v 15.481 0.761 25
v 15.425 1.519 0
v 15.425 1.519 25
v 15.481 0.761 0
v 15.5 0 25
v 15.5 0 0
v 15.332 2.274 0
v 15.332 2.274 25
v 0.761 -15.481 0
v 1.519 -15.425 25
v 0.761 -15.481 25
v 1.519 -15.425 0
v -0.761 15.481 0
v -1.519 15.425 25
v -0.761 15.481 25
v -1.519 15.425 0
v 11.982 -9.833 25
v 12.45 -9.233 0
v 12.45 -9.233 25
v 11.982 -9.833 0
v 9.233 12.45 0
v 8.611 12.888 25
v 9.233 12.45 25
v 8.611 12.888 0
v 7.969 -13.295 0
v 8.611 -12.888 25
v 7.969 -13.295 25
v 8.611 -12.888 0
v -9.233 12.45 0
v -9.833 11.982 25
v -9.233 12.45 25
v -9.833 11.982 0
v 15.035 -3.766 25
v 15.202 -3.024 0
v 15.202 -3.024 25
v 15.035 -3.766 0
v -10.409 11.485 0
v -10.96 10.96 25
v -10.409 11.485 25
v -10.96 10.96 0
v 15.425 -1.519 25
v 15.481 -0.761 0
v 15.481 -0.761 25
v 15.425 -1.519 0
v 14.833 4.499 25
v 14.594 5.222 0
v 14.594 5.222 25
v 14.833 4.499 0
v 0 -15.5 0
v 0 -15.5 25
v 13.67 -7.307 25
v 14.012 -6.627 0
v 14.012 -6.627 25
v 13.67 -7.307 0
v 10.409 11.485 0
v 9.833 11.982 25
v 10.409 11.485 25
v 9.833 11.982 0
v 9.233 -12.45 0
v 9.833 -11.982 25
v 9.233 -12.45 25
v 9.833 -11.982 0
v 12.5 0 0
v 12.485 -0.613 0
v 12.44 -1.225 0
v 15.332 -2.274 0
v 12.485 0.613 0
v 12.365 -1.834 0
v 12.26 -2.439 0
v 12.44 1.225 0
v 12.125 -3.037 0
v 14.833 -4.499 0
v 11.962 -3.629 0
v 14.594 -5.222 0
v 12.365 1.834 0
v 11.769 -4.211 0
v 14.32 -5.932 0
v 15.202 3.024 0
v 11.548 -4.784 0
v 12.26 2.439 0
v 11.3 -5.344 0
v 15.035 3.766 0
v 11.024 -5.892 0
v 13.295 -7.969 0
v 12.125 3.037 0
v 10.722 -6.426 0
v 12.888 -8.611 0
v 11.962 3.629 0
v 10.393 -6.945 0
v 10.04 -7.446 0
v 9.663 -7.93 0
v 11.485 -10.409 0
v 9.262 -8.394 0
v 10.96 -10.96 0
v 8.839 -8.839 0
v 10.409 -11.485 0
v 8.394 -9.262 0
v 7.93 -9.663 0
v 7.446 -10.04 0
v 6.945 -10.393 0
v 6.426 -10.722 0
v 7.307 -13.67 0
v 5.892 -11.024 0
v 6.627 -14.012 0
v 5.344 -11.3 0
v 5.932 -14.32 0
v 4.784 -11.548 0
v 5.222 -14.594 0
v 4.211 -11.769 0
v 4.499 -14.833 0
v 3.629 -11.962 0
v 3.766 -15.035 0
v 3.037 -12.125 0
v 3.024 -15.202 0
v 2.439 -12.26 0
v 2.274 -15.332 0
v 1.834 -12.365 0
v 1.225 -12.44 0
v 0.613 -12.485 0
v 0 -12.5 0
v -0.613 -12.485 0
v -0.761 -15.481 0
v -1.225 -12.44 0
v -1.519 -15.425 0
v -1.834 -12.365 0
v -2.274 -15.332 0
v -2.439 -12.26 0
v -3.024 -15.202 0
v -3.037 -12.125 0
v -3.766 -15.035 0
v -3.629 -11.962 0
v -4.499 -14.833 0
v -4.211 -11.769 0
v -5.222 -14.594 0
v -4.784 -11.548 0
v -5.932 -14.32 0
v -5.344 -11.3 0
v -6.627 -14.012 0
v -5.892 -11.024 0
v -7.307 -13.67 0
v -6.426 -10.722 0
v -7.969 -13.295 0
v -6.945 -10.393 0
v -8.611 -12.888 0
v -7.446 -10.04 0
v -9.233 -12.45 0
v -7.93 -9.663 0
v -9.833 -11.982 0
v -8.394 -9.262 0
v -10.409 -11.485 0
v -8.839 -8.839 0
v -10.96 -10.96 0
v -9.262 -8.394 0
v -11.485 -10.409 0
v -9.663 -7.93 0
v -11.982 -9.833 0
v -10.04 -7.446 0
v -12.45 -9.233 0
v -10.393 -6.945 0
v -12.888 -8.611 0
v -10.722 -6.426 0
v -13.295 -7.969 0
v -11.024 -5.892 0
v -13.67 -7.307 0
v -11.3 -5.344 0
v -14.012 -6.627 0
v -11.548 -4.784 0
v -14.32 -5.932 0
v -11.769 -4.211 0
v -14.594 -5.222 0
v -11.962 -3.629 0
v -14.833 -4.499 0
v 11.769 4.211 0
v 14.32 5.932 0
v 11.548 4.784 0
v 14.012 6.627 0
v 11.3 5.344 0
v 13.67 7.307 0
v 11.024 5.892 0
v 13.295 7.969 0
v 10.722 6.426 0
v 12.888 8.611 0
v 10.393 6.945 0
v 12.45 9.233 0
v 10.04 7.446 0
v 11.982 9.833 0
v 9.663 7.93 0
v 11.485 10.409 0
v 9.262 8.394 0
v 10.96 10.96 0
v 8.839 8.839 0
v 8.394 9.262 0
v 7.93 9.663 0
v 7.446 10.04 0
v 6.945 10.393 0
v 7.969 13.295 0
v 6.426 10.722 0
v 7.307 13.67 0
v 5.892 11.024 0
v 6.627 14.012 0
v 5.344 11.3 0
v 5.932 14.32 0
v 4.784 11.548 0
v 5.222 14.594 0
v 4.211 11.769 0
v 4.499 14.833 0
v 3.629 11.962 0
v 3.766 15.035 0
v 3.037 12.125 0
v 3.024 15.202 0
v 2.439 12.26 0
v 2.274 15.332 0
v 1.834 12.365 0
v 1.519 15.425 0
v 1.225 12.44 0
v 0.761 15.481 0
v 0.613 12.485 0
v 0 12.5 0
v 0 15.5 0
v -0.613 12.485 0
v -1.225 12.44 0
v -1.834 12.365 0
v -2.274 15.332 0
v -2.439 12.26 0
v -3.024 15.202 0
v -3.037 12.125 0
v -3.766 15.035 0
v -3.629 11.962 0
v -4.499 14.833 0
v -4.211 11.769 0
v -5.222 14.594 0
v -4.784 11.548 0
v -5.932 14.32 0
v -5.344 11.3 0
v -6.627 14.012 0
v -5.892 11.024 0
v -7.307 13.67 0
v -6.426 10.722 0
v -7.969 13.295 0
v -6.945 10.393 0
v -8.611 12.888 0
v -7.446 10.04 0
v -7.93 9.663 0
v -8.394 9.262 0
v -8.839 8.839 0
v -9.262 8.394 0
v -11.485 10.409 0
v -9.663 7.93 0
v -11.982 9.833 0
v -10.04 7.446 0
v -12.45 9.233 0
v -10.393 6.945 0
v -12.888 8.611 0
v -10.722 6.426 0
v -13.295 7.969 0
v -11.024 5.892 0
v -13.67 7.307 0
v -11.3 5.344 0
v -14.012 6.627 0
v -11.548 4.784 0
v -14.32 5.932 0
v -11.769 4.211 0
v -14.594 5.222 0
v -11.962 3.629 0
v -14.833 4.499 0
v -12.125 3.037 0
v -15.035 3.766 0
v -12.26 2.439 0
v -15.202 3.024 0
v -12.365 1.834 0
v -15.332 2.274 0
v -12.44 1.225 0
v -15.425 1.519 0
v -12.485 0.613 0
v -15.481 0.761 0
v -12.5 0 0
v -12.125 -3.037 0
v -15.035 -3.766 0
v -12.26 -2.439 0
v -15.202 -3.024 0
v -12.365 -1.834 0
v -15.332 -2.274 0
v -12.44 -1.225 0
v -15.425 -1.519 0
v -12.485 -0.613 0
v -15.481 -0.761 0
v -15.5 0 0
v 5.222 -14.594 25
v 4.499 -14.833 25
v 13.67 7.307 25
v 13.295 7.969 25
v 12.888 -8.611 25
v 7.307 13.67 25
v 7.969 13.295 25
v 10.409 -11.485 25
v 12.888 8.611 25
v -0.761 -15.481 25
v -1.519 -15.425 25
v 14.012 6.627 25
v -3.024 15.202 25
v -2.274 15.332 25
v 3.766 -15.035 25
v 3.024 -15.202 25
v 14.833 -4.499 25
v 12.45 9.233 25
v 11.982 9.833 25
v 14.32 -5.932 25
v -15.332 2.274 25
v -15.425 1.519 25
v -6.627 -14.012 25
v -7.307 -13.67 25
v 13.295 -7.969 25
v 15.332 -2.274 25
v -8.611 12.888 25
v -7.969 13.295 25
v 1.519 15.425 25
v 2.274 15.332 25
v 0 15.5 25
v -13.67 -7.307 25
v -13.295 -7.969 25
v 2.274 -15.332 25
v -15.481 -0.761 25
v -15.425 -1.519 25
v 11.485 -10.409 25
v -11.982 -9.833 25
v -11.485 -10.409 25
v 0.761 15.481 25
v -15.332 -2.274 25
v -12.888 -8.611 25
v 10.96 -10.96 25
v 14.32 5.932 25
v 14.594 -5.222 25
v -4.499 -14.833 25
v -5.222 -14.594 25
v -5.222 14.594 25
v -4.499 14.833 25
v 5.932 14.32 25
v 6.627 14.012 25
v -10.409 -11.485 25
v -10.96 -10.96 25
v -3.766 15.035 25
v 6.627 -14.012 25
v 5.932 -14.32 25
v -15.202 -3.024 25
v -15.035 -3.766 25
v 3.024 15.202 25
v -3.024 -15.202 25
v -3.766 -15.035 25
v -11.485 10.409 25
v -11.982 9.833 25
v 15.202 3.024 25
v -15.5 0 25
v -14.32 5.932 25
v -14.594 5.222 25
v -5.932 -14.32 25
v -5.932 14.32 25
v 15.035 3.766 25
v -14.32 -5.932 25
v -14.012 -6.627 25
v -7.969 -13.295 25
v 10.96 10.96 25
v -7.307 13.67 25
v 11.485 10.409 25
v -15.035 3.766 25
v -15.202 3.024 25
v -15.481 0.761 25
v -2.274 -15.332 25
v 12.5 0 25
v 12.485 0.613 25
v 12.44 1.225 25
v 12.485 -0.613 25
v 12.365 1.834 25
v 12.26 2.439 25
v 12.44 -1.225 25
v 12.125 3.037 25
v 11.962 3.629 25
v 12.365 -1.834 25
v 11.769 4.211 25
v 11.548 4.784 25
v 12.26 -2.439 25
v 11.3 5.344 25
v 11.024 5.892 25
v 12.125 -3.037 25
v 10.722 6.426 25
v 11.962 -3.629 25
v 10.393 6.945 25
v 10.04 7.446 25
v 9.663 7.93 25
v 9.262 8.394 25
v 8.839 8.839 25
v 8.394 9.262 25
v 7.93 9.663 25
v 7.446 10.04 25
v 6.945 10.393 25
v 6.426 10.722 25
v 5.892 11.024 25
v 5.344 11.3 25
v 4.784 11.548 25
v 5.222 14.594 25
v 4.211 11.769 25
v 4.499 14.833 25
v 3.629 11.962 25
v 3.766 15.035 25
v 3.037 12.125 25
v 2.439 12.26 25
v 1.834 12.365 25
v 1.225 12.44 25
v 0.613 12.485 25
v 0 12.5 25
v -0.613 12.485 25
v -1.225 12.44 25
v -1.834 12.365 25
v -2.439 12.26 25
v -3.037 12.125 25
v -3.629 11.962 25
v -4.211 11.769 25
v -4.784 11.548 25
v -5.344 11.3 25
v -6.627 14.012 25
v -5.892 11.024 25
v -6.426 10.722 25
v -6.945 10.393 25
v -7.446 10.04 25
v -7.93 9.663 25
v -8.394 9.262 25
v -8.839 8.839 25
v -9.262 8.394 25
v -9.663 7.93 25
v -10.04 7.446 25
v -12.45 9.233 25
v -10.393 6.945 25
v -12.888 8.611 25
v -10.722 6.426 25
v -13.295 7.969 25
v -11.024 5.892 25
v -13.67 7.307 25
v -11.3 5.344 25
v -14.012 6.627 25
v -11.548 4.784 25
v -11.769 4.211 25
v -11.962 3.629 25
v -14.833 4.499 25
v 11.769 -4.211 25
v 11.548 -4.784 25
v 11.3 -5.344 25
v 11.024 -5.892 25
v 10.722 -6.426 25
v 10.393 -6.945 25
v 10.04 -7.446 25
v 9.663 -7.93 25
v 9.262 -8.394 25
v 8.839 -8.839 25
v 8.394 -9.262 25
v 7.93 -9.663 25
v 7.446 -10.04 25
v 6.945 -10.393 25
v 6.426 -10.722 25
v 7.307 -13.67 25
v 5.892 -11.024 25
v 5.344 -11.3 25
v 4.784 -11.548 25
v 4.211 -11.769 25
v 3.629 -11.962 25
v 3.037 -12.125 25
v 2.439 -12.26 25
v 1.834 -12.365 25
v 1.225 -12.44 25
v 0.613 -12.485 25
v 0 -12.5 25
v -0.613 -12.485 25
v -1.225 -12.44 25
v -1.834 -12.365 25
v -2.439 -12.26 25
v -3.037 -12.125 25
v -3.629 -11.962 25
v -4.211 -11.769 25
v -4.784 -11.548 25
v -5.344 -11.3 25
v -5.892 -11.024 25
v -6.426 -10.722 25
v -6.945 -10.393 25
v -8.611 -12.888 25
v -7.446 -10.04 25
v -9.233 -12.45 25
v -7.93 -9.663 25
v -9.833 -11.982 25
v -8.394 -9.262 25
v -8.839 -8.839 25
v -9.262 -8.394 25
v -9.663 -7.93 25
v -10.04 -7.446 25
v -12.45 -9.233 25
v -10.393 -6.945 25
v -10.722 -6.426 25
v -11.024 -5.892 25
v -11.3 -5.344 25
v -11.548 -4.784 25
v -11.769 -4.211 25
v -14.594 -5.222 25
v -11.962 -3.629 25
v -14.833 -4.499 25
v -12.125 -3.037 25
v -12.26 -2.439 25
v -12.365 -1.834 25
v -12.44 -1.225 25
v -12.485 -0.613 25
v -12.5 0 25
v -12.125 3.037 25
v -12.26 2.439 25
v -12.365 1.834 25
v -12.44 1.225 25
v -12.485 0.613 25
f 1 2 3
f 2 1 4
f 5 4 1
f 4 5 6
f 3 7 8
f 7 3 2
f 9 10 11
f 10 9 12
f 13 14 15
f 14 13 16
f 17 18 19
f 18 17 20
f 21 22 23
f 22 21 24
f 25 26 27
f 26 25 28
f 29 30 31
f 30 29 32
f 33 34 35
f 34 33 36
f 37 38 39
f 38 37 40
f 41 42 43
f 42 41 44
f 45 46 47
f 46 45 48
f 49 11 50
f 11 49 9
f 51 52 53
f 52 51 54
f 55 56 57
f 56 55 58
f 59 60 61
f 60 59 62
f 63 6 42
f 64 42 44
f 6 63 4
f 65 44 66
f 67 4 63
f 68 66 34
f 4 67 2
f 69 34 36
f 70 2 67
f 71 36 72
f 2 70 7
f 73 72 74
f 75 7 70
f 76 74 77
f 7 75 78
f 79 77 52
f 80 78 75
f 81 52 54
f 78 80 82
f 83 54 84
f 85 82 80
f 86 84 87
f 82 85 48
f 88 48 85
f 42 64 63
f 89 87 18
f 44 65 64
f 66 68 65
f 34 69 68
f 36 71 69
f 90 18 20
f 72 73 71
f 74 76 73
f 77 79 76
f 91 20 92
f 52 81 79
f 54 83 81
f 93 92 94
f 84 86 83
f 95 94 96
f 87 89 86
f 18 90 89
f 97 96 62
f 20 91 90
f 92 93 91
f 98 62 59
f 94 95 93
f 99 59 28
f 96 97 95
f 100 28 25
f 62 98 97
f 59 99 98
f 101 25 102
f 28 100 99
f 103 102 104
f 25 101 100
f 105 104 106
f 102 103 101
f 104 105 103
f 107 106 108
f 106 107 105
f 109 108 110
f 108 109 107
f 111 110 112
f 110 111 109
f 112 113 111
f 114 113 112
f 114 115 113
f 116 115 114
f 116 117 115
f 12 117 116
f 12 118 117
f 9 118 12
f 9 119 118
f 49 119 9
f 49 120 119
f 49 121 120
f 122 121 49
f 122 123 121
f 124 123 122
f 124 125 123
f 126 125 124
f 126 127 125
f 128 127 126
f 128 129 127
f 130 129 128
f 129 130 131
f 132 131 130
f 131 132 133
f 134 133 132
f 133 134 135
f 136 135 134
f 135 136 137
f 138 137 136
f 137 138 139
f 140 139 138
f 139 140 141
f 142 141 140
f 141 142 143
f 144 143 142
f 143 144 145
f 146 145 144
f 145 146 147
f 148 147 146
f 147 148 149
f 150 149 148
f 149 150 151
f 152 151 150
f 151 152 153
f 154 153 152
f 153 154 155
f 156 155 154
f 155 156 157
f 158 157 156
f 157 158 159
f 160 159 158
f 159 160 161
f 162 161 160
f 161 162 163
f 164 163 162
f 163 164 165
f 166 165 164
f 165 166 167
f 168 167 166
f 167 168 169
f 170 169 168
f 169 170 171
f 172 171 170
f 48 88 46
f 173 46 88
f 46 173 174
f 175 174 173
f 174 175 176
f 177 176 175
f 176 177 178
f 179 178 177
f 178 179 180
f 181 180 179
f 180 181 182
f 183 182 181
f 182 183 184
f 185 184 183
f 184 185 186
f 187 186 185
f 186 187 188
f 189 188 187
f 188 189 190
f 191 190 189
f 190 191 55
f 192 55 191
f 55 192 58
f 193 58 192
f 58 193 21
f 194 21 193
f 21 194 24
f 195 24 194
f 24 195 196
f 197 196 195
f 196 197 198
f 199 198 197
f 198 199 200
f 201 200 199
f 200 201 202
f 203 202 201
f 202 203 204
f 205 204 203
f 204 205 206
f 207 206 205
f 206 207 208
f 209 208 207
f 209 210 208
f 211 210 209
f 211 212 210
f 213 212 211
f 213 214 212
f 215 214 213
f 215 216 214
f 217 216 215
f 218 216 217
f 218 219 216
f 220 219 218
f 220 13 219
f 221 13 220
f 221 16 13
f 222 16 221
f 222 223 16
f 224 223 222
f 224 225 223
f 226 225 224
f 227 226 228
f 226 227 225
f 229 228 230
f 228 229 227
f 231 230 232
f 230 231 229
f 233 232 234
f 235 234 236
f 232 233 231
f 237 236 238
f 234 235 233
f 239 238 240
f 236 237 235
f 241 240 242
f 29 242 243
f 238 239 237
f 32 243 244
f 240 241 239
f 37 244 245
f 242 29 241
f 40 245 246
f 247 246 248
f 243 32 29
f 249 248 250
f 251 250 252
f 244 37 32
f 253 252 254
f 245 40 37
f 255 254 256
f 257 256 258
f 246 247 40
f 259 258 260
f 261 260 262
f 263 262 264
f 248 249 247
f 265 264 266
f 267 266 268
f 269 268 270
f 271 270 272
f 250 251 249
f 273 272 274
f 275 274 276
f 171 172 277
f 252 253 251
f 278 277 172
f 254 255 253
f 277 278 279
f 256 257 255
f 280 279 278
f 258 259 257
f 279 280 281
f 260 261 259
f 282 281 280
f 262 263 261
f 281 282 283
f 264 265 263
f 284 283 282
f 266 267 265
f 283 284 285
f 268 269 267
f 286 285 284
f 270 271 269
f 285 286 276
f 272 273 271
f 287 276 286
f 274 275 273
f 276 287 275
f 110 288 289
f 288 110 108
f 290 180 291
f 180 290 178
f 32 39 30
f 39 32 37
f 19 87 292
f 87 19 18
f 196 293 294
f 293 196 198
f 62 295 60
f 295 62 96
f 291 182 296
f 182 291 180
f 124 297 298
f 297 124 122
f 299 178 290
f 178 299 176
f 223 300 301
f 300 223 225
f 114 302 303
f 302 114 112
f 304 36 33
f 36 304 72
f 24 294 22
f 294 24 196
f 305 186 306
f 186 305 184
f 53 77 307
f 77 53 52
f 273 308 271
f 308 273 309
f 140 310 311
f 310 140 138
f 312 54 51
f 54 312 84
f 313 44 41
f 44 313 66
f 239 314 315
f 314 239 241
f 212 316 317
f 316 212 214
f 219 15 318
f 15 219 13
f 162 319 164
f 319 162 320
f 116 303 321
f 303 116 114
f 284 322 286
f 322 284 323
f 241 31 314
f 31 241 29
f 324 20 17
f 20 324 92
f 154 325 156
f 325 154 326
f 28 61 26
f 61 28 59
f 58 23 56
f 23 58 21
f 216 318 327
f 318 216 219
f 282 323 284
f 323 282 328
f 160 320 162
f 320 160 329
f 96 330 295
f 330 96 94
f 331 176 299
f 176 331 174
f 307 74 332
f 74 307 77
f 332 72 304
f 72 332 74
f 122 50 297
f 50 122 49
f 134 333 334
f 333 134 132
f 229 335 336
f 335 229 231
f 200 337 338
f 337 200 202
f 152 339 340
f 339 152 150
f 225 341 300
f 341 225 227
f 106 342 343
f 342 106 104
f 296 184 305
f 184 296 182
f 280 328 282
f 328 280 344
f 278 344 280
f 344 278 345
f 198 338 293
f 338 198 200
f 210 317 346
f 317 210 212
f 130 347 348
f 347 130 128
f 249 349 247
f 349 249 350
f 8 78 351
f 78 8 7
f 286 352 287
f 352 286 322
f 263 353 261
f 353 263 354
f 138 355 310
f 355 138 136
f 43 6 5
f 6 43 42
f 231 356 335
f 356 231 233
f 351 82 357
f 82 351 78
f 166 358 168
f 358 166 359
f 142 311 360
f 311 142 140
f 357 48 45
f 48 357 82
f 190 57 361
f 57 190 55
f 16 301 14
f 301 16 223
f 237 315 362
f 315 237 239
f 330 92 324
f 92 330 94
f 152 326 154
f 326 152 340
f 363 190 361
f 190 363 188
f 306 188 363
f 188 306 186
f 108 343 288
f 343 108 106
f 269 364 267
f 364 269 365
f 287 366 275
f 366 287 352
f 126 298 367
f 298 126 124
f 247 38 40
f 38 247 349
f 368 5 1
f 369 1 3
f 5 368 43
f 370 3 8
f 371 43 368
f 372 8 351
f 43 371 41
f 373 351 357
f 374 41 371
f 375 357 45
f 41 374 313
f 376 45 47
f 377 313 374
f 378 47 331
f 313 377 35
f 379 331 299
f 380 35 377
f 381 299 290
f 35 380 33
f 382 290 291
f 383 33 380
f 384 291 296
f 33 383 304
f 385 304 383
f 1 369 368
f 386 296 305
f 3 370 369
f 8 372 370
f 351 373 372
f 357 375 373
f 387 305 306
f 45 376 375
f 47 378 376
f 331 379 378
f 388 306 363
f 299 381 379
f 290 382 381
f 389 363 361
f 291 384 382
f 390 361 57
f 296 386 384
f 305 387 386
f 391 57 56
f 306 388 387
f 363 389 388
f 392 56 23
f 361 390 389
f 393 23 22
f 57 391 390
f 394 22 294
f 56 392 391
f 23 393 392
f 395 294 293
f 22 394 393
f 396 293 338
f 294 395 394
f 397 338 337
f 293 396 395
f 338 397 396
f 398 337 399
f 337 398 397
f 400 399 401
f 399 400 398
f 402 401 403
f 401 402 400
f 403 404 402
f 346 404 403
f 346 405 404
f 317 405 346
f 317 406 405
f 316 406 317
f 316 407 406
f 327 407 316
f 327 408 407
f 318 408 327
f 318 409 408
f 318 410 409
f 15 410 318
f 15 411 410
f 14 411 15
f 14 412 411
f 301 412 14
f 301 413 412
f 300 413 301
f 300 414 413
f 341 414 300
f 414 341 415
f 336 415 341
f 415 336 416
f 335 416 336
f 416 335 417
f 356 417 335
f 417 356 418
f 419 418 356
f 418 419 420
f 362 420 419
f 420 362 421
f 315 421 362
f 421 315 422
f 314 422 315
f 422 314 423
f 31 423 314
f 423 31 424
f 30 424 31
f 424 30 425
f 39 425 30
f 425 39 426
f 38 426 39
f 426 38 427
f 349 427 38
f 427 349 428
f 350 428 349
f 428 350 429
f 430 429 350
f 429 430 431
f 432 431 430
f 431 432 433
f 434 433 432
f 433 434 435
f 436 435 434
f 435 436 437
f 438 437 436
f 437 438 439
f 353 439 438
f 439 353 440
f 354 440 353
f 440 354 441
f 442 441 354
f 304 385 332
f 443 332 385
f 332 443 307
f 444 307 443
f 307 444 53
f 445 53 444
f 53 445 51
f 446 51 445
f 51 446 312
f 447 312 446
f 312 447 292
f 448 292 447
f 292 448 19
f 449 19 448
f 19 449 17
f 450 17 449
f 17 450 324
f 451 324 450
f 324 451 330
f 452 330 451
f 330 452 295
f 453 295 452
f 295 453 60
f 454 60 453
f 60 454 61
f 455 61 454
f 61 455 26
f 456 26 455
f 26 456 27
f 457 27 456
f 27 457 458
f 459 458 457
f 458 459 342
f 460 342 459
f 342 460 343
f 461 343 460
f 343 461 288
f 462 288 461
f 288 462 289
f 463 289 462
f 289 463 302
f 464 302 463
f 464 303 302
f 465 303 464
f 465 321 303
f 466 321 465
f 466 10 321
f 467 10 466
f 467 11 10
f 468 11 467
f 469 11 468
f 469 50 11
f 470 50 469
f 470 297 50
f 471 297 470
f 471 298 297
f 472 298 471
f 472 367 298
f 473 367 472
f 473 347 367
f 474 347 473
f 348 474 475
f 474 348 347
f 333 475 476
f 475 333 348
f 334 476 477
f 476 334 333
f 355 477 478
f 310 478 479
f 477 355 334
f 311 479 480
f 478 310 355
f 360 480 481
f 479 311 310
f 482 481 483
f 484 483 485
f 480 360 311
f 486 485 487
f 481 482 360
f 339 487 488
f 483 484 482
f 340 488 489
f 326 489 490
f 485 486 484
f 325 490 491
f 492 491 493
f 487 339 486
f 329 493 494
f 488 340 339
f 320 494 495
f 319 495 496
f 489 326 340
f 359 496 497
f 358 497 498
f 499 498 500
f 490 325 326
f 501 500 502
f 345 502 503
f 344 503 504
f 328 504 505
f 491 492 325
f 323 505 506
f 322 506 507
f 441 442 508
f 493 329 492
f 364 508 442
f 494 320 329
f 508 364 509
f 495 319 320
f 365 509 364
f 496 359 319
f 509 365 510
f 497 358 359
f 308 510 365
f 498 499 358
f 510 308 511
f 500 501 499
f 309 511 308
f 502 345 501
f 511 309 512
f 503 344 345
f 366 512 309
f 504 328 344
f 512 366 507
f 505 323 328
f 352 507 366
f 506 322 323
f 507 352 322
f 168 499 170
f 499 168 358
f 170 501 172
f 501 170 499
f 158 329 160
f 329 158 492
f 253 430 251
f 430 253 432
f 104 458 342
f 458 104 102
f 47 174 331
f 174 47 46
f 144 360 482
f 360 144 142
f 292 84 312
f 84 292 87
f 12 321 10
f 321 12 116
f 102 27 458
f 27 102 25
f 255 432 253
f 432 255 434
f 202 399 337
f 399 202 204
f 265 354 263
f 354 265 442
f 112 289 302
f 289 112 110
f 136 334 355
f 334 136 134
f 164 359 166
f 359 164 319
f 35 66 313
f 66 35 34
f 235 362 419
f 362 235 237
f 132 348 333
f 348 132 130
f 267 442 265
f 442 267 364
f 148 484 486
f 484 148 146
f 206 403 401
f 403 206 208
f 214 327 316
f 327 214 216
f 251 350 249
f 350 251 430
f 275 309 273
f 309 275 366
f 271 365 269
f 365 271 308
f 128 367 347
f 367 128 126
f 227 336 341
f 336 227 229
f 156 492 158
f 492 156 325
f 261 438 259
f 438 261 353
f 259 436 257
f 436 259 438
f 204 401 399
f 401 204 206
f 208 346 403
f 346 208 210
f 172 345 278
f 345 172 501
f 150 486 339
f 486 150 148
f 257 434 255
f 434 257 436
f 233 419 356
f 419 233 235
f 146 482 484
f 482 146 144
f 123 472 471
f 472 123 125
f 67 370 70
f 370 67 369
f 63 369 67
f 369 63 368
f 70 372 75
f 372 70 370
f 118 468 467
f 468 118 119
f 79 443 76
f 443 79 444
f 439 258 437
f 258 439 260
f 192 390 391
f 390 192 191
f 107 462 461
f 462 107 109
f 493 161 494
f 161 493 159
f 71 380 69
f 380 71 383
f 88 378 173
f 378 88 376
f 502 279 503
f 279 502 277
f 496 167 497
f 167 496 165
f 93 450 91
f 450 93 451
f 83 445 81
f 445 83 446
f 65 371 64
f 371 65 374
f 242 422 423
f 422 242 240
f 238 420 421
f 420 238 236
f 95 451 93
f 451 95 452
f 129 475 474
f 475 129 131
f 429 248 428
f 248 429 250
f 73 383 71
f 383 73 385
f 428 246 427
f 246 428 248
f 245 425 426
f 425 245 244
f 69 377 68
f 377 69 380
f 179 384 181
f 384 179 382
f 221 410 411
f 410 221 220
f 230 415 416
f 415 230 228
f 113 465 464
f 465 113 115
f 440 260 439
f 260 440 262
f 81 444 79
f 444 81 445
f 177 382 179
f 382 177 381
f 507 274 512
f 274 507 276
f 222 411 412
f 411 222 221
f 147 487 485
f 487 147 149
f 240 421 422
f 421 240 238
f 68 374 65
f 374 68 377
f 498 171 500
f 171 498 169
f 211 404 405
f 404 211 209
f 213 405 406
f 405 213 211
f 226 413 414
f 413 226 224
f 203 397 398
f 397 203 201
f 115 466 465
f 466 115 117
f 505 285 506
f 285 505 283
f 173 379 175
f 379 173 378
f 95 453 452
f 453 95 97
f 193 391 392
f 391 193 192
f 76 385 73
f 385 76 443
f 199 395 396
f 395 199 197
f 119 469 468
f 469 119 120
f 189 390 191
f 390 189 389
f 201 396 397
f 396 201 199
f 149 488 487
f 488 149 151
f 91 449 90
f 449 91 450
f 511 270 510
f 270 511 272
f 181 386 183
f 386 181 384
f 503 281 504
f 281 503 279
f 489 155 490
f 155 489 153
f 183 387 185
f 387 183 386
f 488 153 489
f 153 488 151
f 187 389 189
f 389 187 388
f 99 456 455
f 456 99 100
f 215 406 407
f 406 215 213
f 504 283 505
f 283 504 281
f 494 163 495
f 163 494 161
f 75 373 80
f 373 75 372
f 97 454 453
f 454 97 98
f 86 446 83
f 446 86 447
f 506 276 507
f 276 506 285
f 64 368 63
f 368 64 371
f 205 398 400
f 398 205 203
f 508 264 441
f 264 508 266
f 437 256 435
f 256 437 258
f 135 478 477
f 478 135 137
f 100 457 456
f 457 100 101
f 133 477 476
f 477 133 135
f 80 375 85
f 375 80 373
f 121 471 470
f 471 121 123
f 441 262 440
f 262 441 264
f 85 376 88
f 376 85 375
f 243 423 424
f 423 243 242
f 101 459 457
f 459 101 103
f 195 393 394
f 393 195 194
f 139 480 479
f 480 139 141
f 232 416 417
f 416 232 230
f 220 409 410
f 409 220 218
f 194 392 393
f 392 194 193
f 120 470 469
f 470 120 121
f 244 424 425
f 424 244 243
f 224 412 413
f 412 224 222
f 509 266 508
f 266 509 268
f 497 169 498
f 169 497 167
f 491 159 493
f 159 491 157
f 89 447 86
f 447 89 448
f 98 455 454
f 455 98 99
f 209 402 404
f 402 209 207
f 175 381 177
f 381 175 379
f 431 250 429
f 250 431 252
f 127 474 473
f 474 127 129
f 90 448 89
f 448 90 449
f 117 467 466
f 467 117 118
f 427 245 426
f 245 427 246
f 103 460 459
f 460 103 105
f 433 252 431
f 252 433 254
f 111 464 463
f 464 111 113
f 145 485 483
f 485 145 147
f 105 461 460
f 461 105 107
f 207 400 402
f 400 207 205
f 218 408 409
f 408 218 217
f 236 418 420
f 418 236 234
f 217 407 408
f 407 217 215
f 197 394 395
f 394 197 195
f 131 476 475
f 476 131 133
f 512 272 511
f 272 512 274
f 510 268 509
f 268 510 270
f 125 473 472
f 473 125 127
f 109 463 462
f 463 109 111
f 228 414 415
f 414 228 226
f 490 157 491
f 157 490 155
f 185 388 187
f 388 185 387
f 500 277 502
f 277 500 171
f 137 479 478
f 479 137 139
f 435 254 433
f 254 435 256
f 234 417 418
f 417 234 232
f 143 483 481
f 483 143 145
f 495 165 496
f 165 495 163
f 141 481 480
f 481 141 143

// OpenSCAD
// file: ../stub_tube.scad
// A tube standing on the bed with its bore through: what the dust category's
// stand-ins are drawn as, until the real hose and fittings are measured. A
// library the parts include, not a part.
module stub_tube(bore, outer, length) {
    difference() {
        cylinder(h = length, d = outer);
        translate([0, 0, -1]) cylinder(h = length + 2, d = bore);
    }
}
// main file
// A stand-in for a rigid dust port with a 25 mm bore, a tool's or a
// collector's, until one is measured: 25 mm of it, its mouth at the top.

include <../stub_tube.scad>

bore = 25;
outer = 31;
length = 25;
$fn = 128;

stub_tube(bore, outer, length);
